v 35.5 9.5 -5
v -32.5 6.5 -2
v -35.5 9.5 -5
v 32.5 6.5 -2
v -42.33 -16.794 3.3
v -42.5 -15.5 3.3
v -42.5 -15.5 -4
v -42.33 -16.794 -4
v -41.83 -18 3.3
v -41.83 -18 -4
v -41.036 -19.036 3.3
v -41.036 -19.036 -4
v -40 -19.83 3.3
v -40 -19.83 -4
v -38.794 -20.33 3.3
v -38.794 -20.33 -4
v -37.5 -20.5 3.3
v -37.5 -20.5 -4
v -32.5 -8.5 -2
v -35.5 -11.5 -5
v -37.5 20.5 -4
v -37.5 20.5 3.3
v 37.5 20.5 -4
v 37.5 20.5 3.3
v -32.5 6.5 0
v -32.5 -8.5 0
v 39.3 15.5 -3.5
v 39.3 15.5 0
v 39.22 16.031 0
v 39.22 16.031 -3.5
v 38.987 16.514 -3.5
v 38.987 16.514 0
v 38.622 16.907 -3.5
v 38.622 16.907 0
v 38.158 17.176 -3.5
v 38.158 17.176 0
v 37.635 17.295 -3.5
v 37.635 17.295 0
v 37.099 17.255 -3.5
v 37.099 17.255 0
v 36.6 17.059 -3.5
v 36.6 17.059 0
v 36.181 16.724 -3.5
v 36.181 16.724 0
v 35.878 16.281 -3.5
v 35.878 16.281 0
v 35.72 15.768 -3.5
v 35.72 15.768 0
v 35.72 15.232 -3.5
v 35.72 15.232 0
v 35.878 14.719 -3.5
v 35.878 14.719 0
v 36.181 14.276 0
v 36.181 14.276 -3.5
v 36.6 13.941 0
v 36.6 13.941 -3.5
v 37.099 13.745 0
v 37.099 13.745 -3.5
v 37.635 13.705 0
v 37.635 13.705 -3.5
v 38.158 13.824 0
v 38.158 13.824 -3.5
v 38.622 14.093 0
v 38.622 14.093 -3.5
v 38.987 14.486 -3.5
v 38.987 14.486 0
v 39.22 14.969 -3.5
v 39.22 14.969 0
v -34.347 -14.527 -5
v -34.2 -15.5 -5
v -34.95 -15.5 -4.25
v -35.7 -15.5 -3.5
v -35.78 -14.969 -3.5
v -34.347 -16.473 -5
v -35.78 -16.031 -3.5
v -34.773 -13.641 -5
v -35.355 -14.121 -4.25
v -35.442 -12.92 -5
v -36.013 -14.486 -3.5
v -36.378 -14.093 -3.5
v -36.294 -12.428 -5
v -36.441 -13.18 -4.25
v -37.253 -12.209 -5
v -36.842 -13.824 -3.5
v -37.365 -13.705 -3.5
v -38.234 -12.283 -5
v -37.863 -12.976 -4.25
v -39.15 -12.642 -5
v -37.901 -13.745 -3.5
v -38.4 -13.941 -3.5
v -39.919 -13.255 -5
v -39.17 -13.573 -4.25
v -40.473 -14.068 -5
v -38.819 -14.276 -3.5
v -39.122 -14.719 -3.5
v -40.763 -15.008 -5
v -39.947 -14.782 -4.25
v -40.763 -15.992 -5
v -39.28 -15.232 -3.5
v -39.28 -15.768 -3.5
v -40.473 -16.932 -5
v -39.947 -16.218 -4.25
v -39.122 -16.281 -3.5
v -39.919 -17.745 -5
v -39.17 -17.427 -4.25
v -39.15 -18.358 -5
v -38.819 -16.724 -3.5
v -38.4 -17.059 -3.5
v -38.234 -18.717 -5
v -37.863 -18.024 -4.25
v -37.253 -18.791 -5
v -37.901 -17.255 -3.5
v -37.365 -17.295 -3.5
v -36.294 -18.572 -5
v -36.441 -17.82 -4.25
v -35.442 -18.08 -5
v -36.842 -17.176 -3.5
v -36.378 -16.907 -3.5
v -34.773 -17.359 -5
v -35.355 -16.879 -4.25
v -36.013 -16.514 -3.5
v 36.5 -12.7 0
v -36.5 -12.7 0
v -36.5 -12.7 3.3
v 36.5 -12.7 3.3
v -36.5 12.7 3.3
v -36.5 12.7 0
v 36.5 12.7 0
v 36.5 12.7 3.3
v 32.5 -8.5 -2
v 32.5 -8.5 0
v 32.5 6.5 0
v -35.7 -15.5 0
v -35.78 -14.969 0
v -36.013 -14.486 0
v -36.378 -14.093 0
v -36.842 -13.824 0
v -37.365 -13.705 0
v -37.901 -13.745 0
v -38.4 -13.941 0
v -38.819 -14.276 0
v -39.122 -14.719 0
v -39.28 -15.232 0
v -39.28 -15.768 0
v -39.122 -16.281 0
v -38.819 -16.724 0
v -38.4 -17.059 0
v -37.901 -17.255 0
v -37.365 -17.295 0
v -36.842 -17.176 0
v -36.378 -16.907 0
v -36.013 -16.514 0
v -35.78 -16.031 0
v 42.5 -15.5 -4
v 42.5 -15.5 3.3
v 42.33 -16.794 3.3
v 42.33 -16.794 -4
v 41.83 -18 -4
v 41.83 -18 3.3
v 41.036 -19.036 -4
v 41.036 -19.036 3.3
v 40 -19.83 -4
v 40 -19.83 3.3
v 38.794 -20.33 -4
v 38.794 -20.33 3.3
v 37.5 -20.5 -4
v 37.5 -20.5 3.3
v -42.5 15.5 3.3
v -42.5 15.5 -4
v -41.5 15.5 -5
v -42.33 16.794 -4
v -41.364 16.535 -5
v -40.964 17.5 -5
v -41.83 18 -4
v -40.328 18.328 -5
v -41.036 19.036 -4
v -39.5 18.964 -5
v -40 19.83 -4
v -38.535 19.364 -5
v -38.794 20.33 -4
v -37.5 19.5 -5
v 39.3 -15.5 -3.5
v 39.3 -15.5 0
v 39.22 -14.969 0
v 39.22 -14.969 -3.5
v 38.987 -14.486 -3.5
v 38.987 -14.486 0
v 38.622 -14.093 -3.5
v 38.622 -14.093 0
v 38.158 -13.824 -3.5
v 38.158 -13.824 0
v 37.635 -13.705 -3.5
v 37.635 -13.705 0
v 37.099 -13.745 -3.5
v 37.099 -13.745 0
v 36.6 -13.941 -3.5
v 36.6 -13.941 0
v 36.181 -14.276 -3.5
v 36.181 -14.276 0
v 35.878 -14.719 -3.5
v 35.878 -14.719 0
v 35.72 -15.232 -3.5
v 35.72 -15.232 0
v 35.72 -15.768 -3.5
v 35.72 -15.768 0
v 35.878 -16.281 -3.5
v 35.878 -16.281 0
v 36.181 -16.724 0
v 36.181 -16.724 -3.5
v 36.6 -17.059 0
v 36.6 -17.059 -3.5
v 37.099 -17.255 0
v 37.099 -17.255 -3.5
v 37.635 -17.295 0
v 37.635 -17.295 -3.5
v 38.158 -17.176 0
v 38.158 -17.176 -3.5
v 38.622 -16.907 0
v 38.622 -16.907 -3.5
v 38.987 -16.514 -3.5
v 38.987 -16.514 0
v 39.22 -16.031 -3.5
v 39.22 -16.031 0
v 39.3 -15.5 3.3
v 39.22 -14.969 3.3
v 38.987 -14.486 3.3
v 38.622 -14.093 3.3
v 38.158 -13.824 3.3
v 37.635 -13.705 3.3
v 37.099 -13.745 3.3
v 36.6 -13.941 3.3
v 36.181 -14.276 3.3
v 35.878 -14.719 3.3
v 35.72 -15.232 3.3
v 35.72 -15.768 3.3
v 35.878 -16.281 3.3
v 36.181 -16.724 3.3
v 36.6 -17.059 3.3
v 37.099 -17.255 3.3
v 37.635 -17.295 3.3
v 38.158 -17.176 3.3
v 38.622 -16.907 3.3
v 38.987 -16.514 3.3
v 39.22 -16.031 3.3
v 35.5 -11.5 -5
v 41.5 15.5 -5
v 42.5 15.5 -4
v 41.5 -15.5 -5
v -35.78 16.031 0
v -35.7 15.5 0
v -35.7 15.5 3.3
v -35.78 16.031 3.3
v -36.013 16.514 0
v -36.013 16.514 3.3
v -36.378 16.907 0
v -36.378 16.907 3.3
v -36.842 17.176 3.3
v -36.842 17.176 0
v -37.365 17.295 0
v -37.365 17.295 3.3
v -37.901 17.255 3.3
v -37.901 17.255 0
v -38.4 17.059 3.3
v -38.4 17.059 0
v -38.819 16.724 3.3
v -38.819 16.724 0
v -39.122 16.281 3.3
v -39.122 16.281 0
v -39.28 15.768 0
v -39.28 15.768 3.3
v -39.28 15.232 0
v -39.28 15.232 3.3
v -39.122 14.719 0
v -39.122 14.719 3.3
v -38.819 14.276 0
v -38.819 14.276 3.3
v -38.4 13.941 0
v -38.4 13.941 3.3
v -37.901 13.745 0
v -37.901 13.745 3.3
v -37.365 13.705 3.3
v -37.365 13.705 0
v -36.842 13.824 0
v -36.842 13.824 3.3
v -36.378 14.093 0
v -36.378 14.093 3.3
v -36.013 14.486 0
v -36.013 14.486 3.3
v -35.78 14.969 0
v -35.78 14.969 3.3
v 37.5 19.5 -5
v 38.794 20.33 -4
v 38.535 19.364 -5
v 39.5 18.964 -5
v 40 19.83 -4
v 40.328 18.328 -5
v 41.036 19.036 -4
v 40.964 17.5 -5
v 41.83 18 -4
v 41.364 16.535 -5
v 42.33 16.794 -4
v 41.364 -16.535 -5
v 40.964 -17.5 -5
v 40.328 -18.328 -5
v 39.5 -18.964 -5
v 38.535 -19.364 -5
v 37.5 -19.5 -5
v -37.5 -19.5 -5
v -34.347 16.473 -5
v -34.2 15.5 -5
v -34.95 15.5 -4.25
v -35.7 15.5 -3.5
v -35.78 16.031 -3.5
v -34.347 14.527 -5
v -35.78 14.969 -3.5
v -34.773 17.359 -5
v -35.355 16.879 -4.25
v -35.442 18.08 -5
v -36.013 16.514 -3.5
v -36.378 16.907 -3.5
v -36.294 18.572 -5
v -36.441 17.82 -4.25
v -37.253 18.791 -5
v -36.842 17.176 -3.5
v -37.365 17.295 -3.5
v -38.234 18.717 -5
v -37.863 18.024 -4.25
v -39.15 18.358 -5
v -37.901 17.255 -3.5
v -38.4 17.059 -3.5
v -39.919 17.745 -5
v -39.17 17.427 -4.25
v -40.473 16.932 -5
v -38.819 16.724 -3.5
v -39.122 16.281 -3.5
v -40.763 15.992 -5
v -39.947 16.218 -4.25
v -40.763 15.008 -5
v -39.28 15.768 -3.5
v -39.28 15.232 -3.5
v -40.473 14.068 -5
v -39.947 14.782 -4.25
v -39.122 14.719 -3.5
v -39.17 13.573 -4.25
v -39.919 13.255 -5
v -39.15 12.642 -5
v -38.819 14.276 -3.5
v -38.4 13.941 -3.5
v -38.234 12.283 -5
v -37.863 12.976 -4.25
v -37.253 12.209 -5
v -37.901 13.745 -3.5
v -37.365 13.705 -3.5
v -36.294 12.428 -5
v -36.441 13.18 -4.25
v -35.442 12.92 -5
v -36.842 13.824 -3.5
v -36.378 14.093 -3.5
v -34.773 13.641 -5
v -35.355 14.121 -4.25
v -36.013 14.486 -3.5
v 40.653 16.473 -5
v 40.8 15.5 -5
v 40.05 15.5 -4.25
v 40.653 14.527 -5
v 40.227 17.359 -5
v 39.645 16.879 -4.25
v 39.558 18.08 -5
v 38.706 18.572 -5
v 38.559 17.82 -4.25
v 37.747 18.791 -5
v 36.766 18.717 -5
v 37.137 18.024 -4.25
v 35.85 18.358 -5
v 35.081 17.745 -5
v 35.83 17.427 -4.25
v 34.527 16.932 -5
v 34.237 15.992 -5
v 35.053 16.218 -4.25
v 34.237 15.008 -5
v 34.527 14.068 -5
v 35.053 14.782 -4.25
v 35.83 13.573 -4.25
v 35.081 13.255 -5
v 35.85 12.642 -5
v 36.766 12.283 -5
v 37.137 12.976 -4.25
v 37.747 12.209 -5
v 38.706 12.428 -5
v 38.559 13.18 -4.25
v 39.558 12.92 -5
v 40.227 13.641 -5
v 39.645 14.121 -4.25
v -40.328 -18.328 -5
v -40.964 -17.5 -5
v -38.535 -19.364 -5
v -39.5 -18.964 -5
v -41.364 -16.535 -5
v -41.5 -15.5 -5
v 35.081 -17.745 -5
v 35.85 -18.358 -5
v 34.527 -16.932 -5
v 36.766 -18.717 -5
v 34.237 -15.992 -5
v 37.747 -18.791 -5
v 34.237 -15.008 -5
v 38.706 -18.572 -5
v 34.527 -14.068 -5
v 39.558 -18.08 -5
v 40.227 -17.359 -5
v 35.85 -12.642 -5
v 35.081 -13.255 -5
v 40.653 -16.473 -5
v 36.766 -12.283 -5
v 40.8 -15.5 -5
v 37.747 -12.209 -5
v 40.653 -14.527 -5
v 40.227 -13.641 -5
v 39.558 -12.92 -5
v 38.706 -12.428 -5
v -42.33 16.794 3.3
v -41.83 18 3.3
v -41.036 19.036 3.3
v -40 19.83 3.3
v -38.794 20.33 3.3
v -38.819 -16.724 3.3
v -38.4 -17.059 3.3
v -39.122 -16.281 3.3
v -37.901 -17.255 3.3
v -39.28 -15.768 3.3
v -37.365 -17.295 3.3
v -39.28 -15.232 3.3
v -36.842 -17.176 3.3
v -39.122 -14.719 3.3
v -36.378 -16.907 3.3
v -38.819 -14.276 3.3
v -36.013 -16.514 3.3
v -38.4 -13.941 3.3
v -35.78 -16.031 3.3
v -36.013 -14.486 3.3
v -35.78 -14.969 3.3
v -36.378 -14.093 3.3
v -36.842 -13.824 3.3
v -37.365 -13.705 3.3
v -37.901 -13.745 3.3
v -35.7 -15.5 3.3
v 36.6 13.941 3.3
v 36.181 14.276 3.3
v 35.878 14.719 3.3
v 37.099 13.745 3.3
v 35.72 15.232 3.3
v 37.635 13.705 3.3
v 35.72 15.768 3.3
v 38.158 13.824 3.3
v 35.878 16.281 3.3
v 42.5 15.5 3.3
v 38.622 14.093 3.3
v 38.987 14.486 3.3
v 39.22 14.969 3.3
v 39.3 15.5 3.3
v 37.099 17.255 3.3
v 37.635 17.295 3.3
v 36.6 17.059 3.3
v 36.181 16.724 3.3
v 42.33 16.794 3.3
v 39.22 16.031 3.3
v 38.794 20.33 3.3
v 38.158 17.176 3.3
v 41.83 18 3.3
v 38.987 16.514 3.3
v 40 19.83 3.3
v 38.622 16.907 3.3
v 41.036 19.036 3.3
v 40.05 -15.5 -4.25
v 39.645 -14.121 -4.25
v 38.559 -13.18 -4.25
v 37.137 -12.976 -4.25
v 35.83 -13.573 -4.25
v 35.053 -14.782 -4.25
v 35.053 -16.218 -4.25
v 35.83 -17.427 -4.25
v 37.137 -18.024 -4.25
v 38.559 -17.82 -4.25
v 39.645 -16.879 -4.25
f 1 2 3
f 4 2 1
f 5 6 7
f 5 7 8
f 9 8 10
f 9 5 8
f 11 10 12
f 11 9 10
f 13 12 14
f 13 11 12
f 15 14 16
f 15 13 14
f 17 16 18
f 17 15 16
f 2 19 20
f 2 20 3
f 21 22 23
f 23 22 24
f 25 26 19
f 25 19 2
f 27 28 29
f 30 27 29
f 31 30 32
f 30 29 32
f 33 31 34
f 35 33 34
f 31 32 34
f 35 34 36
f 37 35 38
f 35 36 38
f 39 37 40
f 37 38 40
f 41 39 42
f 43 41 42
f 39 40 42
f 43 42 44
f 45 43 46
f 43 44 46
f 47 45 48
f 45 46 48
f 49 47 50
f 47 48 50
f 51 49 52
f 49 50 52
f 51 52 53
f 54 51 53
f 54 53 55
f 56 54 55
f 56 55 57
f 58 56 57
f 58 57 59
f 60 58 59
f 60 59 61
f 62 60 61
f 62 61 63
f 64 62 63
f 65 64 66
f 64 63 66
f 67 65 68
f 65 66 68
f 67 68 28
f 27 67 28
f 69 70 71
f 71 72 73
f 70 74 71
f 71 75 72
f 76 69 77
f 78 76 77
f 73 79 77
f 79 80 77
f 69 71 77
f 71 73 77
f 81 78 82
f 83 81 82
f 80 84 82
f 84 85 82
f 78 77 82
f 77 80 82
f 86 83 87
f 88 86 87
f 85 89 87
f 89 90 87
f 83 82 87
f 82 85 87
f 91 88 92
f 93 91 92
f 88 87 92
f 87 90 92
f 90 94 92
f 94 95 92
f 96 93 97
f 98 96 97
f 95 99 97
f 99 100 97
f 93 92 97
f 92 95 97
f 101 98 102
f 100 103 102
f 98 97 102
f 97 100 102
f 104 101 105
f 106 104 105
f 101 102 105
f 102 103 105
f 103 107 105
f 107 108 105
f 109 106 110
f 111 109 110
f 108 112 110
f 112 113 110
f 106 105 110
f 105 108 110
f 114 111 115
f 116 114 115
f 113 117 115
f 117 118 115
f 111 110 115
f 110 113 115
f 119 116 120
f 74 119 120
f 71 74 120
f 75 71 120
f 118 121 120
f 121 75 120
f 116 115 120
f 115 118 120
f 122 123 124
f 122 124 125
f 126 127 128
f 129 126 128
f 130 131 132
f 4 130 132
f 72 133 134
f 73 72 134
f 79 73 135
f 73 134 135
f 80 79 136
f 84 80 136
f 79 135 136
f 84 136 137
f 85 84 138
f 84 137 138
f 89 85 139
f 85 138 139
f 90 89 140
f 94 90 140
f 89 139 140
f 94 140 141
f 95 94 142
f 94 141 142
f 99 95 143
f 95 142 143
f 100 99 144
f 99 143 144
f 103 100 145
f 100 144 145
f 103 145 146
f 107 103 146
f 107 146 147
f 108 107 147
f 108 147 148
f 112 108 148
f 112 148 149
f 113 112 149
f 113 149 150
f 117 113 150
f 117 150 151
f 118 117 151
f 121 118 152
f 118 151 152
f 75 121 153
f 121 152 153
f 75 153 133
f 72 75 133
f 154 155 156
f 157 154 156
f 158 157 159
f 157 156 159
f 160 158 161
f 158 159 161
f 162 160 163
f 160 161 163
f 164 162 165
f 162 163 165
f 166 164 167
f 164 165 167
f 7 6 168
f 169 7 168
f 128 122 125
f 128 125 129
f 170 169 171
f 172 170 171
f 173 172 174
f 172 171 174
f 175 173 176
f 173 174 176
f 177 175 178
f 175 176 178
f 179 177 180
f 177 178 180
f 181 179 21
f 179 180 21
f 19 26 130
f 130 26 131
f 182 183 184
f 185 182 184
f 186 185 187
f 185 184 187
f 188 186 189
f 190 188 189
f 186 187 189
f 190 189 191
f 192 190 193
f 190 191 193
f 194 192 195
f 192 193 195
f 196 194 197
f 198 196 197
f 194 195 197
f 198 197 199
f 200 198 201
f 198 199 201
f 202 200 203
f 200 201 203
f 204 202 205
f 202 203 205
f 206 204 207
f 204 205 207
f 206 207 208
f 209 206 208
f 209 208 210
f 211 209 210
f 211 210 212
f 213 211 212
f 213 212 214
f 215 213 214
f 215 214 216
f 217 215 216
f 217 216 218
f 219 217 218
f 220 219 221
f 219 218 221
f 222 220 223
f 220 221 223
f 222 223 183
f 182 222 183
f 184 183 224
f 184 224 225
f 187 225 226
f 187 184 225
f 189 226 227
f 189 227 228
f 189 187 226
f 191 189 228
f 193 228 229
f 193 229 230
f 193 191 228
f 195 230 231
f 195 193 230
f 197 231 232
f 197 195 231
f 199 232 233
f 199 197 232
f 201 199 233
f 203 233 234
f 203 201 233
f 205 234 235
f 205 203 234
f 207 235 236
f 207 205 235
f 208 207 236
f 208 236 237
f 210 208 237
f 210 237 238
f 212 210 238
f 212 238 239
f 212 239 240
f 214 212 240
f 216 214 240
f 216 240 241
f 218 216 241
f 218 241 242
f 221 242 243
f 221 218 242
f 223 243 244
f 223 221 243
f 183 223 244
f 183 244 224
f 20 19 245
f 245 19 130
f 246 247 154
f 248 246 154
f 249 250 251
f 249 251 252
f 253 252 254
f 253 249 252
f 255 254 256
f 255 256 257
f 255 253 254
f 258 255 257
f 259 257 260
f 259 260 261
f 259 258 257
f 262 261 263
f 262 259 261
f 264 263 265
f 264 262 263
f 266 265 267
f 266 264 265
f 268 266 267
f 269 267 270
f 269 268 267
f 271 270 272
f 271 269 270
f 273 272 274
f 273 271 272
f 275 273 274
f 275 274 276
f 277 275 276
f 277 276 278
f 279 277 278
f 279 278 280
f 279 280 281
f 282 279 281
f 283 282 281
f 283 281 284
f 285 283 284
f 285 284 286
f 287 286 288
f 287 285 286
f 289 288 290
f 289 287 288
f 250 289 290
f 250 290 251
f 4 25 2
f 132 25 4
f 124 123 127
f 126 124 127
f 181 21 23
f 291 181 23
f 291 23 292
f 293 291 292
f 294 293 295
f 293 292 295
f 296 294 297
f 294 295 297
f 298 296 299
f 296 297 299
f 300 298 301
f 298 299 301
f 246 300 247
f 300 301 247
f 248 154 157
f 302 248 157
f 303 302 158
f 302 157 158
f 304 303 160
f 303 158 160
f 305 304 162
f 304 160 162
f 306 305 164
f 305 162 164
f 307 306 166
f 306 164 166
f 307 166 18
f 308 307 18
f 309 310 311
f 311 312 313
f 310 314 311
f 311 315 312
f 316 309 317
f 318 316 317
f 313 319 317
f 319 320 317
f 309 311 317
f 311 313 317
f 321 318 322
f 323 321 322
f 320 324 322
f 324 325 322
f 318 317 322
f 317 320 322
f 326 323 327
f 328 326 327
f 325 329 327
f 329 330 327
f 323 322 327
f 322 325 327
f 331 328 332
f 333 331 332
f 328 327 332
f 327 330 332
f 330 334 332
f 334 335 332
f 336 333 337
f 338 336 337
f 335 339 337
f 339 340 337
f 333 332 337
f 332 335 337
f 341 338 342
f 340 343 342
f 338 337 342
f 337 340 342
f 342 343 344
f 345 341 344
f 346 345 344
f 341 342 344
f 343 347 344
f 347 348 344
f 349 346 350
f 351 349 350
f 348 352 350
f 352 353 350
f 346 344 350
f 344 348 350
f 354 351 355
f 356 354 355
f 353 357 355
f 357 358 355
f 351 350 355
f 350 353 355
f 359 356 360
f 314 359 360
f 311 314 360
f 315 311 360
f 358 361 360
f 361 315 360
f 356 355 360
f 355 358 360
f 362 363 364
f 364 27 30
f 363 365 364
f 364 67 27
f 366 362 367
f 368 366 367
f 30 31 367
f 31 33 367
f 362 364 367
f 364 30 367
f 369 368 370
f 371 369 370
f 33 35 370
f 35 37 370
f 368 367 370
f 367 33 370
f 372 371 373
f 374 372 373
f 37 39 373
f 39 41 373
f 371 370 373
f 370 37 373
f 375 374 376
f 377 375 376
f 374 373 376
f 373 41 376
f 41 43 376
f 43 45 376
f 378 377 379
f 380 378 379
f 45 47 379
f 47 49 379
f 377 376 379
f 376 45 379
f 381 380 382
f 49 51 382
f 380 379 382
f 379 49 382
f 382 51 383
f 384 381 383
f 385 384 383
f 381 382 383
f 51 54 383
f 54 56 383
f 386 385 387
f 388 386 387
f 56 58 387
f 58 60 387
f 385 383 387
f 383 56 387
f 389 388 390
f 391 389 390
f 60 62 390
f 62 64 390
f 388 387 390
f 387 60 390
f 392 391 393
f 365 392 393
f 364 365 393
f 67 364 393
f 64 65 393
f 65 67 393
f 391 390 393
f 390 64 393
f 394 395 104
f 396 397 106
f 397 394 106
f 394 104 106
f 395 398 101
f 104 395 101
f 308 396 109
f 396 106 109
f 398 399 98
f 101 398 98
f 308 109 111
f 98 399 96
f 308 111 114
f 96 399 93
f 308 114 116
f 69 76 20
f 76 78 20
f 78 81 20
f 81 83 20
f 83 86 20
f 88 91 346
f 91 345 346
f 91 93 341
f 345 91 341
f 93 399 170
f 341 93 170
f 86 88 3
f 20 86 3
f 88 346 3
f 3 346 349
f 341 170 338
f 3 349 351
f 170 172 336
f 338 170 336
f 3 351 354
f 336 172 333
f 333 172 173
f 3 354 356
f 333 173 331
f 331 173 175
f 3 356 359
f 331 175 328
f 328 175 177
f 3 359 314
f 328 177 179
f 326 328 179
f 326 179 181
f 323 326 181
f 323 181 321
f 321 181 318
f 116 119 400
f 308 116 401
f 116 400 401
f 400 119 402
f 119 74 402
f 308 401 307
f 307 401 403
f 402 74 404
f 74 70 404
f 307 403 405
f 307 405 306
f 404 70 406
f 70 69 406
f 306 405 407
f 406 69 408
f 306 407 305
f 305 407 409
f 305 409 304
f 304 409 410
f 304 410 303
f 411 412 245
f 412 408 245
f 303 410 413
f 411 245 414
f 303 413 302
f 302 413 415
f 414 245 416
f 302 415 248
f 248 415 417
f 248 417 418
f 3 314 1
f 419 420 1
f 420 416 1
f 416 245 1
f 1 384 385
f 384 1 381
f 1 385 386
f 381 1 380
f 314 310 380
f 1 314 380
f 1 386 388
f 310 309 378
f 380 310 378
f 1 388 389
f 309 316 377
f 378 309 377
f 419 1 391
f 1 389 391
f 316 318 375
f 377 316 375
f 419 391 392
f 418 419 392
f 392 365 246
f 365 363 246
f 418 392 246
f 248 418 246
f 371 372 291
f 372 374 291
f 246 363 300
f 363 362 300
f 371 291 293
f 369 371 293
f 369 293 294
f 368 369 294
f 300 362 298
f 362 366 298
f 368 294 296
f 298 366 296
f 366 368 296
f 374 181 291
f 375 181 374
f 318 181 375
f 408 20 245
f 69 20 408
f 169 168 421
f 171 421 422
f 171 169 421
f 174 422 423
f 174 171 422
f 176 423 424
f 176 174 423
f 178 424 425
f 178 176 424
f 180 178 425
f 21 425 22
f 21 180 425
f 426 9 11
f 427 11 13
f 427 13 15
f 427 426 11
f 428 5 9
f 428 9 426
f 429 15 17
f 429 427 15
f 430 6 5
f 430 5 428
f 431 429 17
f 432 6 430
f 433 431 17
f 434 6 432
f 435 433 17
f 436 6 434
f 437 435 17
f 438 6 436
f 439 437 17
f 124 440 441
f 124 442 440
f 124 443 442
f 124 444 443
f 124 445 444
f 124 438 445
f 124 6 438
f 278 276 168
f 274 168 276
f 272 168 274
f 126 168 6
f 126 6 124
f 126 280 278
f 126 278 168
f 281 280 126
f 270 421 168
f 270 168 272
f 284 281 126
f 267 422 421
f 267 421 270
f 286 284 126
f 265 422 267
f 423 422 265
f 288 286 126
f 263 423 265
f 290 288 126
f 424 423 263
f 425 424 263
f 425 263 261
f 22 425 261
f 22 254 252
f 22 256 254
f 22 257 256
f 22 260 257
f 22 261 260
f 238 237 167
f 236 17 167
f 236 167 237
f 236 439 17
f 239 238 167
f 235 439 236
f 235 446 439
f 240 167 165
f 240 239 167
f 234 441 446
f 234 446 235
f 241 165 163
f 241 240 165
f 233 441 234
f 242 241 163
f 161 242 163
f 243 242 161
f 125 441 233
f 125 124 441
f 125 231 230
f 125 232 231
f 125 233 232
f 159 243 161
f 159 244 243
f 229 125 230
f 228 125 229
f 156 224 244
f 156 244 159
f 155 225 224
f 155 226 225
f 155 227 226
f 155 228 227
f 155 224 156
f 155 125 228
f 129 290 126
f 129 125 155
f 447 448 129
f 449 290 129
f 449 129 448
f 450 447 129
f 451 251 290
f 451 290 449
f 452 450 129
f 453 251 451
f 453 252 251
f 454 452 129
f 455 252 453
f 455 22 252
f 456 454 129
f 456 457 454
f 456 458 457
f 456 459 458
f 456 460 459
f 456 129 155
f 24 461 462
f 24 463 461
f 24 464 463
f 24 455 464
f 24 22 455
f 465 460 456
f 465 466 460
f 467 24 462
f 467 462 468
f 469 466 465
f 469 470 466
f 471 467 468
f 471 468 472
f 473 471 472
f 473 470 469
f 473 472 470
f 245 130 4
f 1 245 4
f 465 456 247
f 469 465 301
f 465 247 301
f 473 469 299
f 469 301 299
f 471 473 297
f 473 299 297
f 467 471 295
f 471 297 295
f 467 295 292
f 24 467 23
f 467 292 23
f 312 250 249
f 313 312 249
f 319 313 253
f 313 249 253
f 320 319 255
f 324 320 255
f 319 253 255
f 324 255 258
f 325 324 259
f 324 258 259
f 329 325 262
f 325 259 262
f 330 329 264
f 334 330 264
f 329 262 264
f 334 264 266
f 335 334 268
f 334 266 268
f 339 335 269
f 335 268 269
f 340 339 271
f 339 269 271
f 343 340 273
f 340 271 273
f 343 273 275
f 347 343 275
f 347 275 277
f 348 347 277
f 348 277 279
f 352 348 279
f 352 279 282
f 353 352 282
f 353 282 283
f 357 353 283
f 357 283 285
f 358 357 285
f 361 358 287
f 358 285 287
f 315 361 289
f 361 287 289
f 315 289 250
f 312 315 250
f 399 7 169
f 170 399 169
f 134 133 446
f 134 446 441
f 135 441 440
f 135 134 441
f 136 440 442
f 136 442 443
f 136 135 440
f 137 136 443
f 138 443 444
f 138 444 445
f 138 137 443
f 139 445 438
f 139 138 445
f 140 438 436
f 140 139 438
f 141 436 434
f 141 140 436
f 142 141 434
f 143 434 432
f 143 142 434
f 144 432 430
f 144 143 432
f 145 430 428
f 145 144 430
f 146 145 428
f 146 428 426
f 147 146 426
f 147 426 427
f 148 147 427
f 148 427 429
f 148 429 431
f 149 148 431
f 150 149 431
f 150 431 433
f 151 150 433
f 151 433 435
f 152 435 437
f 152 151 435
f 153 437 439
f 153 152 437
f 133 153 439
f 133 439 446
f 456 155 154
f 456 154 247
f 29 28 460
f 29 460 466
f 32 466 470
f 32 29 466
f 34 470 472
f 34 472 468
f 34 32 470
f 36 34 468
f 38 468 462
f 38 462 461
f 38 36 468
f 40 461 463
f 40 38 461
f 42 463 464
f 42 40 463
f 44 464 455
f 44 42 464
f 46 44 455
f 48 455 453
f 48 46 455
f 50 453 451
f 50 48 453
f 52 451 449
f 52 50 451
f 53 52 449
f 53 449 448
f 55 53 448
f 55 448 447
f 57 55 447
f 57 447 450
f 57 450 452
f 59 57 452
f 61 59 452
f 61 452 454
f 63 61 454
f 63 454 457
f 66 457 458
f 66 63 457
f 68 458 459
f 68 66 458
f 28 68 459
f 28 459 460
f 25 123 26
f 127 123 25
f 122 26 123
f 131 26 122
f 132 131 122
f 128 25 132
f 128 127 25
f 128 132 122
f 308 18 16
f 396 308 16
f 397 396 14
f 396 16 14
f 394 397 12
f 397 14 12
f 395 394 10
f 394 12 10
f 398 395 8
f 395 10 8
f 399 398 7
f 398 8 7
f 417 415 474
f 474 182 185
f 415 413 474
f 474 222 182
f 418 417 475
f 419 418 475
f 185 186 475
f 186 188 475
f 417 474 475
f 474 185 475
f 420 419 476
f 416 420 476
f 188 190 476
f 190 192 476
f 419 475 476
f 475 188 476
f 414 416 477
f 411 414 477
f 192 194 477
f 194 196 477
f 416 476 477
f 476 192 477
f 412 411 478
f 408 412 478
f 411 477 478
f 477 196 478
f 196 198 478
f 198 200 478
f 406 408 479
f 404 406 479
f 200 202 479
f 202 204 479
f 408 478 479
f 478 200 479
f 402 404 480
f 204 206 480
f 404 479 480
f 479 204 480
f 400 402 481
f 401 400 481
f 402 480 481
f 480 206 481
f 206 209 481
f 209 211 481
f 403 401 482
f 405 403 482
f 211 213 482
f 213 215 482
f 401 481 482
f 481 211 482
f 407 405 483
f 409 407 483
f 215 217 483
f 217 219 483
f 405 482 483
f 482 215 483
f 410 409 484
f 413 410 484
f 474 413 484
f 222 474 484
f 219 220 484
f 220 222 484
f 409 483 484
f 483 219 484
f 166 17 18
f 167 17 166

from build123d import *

# Parameters (mm, degrees)
F0_W     = 85
F0_H     = 41
F0_R     = 1.8
F0_W_2   = 73
F0_H_2   = 25.4
F1_DEPTH = 3.3
F0_W_3   = 65
F0_H_3   = 15
F2_DEPTH = 5
F3_R     = 5
F4_SIZE  = 3
F5_SIZE  = 1
F6_SIZE  = 1.5


with BuildPart() as f1:
    # F0 (on Top) → F1 (new body)
    with BuildSketch(Plane.XY):
        Rectangle(F0_W, F0_H)
        with Locations((-37.5, -15.5)):
            Circle(F0_R, mode=Mode.SUBTRACT)
        with Locations((37.5, -15.5)):
            Circle(F0_R, mode=Mode.SUBTRACT)
        with Locations((-37.5, 15.5)):
            Circle(F0_R, mode=Mode.SUBTRACT)
        Rectangle(F0_W_2, F0_H_2, mode=Mode.SUBTRACT)
        with Locations((37.5, 15.5)):
            Circle(F0_R, mode=Mode.SUBTRACT)
    extrude(amount=F1_DEPTH)

    # F0 (on Top) → F2 (join)
    with BuildSketch(Plane.XY):
        Rectangle(F0_W, F0_H)
        with Locations((-37.5, -15.5)):
            Circle(F0_R, mode=Mode.SUBTRACT)
        with Locations((37.5, -15.5)):
            Circle(F0_R, mode=Mode.SUBTRACT)
        with Locations((-37.5, 15.5)):
            Circle(F0_R, mode=Mode.SUBTRACT)
        Rectangle(F0_W_2, F0_H_2, mode=Mode.SUBTRACT)
        with Locations((37.5, 15.5)):
            Circle(F0_R, mode=Mode.SUBTRACT)
        Rectangle(F0_W_2, F0_H_2)
        with Locations((0, -1)):
            Rectangle(F0_W_3, F0_H_3, mode=Mode.SUBTRACT)
    extrude(amount=-F2_DEPTH)

    # F3
    f3_edges = [f1.edges().sort_by_distance(p)[0] for p in [
        (-42.5, 20.5, -0.85),
        (-42.5, -20.5, -0.85),
        (42.5, 20.5, -0.85),
        (42.5, -20.5, -0.85),
    ]]
    fillet(f3_edges, radius=F3_R)

    # F4
    f4_edges = [f1.edges().sort_by_distance(p)[0] for p in [
        (0, -8.5, -5),
        (-32.5, -1, -5),
        (0, 6.5, -5),
        (32.5, -1, -5),
    ]]
    chamfer(f4_edges, length=F4_SIZE)

    # F5
    f5_edges = [f1.edges().sort_by_distance(p)[0] for p in [
        (-42.5, 0, -5),
    ]]
    chamfer(f5_edges, length=F5_SIZE)

    # F6
    f6_edges = [f1.edges().sort_by_distance(p)[0] for p in [
        (-39.3, 15.5, -5),
        (-39.3, -15.5, -5),
        (35.7, -15.5, -5),
        (35.7, 15.5, -5),
    ]]
    chamfer(f6_edges, length=F6_SIZE)


solid = f1.part
